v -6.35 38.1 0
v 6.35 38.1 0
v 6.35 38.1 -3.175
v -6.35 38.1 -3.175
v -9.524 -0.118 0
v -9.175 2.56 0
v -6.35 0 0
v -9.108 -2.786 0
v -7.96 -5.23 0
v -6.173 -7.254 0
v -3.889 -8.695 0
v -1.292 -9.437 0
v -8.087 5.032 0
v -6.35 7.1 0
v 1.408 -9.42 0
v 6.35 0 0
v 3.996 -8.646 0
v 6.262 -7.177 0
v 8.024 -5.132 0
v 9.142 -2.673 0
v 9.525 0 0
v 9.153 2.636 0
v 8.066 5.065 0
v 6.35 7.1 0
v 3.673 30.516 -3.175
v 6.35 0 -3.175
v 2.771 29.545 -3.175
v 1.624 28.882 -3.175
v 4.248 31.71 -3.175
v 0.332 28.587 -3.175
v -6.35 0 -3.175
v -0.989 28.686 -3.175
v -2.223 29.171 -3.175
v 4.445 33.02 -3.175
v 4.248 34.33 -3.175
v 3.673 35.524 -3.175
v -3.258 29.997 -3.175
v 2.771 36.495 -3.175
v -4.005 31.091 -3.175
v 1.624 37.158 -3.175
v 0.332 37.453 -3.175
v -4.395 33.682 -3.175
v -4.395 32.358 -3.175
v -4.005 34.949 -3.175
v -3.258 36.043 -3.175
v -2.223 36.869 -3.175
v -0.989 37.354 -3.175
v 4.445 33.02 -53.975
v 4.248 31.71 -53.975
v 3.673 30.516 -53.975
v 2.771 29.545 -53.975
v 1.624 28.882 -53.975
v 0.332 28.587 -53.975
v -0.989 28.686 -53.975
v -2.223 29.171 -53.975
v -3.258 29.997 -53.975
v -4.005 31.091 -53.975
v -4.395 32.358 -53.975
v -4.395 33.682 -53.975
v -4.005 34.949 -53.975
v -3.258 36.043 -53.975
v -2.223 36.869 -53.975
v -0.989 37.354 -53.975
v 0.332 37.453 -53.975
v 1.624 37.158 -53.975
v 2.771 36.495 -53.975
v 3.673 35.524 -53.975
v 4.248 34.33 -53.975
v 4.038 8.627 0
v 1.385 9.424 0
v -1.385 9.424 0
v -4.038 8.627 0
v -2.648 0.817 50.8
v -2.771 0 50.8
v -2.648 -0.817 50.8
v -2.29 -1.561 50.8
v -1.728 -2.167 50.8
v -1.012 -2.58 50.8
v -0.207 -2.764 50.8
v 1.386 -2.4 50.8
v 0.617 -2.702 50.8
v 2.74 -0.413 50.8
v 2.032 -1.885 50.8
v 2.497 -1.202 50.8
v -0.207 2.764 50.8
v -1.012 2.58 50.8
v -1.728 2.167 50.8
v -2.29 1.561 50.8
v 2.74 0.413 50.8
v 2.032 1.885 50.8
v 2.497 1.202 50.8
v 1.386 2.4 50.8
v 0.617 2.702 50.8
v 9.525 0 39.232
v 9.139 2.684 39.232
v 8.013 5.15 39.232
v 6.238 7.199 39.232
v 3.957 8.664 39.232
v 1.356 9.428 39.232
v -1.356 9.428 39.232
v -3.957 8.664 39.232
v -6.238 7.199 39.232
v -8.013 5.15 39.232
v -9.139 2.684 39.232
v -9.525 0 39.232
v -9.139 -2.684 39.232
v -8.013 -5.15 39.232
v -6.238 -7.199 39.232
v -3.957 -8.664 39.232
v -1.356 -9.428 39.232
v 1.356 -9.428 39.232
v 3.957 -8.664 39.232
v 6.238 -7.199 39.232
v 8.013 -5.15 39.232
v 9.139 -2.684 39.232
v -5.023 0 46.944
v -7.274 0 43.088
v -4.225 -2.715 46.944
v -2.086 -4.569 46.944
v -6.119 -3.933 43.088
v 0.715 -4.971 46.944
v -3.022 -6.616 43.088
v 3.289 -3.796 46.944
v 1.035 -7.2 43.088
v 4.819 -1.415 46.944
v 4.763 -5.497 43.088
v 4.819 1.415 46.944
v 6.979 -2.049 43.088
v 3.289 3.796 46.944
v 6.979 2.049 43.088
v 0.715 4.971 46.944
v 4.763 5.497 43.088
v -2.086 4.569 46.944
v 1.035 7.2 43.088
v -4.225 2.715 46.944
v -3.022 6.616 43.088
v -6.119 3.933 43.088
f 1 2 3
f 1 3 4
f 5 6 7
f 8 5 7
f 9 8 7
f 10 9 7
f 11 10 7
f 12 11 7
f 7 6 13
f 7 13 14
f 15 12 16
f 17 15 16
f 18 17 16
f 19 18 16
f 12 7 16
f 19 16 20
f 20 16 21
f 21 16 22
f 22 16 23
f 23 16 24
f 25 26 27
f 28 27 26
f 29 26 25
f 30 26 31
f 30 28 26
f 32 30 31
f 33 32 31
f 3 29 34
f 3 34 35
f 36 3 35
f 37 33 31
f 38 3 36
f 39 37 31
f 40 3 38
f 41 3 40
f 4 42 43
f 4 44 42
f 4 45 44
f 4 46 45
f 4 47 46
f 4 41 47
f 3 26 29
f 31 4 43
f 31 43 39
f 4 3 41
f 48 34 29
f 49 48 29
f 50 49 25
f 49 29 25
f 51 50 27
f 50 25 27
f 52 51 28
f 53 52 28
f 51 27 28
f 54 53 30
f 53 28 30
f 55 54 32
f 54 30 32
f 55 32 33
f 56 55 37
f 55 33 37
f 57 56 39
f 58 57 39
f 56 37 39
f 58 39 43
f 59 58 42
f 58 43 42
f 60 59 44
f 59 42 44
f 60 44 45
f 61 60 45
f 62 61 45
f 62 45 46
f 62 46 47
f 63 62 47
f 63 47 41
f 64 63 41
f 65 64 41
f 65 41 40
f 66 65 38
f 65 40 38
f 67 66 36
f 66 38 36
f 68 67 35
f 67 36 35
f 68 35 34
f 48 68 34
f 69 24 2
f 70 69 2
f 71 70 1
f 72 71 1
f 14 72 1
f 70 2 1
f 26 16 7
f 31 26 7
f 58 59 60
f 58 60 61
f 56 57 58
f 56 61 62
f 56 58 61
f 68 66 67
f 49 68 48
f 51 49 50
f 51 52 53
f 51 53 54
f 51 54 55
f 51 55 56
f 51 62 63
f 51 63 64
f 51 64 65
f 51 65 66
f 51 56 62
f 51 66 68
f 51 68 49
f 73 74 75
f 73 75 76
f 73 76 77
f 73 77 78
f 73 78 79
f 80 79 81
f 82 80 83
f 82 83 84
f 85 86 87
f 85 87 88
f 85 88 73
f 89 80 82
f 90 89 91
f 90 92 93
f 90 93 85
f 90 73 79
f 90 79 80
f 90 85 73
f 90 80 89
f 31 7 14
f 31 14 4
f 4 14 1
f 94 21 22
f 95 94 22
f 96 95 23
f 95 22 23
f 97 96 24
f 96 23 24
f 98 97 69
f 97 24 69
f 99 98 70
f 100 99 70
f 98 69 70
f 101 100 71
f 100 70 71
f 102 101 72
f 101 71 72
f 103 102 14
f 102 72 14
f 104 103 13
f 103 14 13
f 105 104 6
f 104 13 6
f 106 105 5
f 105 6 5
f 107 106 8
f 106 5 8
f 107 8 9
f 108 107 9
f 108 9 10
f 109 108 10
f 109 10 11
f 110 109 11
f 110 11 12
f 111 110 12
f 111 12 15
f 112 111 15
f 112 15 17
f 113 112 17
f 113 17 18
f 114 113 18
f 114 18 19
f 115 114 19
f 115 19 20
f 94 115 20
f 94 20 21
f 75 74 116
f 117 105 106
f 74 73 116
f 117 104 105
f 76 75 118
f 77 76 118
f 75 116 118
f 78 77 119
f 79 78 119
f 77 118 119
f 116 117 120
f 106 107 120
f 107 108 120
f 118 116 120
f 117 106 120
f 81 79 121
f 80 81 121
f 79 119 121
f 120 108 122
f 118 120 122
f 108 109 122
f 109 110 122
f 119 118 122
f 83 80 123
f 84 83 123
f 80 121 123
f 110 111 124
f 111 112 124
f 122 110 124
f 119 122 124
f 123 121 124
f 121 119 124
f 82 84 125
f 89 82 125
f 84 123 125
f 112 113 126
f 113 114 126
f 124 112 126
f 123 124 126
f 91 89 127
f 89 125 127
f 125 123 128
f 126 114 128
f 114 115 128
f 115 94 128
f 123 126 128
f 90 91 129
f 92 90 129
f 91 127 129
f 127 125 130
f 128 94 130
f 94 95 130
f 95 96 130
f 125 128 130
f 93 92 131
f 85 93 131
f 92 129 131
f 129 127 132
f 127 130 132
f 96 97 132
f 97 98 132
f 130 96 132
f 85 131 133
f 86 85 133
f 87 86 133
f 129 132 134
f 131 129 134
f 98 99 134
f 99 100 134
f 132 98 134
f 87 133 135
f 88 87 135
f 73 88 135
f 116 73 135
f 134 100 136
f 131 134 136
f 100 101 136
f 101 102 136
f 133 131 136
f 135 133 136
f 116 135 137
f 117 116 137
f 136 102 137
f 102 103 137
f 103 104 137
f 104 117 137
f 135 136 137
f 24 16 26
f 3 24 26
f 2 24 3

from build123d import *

# Parameters (mm, degrees)
SKETCH1_R           = 9.525
BOSS_EXTRUDE1_DEPTH = 50.8
SKETCH2_W           = 12.7
SKETCH2_H           = 38.1
BOSS_EXTRUDE2_DEPTH = 3.175
SKETCH3_R           = 4.445
BOSS_EXTRUDE3_DEPTH = 50.8


with BuildPart() as part:
    # Sketch1 → Boss-Extrude1 (new body)
    with BuildSketch(Plane.XY):
        Circle(SKETCH1_R)
    extrude(amount=BOSS_EXTRUDE1_DEPTH)

    # Sketch2 → Boss-Extrude2 (add)
    with BuildSketch(Plane(origin=(0, 0, 0), x_dir=(-1, 0, 0), z_dir=(0, 0, -1))):
        with Locations((0, 19.05)):
            Rectangle(SKETCH2_W, SKETCH2_H)
    extrude(amount=BOSS_EXTRUDE2_DEPTH)

    # Sketch3 → Boss-Extrude3 (add)
    with BuildSketch(Plane(origin=(0, 0, -3.175), x_dir=(-1, 0, 0), z_dir=(0, 0, -1))):
        with Locations((0, 33.02)):
            Circle(SKETCH3_R)
    extrude(amount=BOSS_EXTRUDE3_DEPTH)

    # Sketch4 → Cut-Revolve1 (revolve, cut)
    with BuildSketch(Plane(origin=(0, 0, 0), x_dir=(0, 0, -1), z_dir=(1, 0, 0))):
        Polygon((-50.8, 2.77134643), (-39.232133446, 9.525), (-50.8, 9.525), align=None)
    revolve(axis=Axis((0, 0, -0.789350743), (0, 0, 1)), mode=Mode.SUBTRACT)


solid = part.part
